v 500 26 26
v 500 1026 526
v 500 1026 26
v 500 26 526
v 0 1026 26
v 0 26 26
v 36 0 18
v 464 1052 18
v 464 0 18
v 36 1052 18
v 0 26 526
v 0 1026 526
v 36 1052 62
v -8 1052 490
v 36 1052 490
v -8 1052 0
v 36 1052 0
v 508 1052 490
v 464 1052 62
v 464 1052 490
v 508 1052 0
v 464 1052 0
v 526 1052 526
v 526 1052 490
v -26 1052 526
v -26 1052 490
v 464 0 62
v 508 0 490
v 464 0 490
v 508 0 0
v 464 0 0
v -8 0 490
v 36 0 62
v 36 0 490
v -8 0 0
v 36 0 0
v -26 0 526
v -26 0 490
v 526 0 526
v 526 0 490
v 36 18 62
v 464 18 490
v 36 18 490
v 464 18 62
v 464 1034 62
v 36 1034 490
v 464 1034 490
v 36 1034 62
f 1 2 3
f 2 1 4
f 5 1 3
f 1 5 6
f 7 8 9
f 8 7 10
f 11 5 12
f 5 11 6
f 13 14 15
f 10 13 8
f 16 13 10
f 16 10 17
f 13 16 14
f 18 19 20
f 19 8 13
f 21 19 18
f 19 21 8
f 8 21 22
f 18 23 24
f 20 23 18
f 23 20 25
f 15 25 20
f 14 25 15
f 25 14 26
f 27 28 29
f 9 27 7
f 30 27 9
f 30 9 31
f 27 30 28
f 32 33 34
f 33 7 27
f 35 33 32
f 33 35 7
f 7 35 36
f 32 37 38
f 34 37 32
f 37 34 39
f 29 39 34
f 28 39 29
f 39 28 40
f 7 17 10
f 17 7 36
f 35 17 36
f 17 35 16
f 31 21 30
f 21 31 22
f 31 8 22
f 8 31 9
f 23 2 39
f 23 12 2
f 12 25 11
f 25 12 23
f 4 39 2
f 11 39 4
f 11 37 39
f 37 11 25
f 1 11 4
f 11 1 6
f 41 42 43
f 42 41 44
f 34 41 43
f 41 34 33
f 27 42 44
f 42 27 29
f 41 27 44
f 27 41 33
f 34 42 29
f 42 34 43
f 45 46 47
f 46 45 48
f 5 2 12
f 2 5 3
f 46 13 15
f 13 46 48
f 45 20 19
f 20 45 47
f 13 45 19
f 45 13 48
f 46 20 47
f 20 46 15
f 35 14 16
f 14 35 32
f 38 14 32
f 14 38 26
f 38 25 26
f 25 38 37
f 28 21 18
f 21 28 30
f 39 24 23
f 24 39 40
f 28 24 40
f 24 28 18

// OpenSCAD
// Archiyou -> OpenSCAD  |  script: artcrate  |  units: mm
// OpenSCAD has no units: coordinates are in mm.
// Parts: 17 CSG, 0 baked, 0 2D
// Skipped: Curve:Line (open curve)
// Parameters at export, for reference only (nothing in this file is linked to them):
//   WIDTH = 50
//   DEPTH = 100
//   HEIGHT = 50
//   BOARD_THICKNESS = 8
//   LAT_WIDTH = 36
//   LAT_HEIGHT = 18

$fn = 32;
PART = "";

// bottomPlate  (layer bottom)
module bottomPlate() {
    color([0, 0, 1]) translate([250, 526, 22]) cube([500, 1052, 8], center = true);
}

// bottomLatLeft  (layer bottom)
module bottomLatLeft() {
    color([0, 0, 1]) translate([18, 526, 9]) cube([36, 1052, 18], center = true);
}

// bottomLatRight  (layer bottom)
module bottomLatRight() {
    color([0, 0, 1]) translate([482, 526, 9]) cube([36, 1052, 18], center = true);
}

// sideFrontPlate  (layer sidefront)
module sideFrontPlate() {
    color([0.502, 0, 0.502]) translate([250, 22, 276]) cube([500, 8, 500], center = true);
}

// sideFrontLatLeft  (layer sidefront)
module sideFrontLatLeft() {
    color([0.502, 0, 0.502]) translate([18, 9, 276]) cube([36, 18, 500], center = true);
}

// sideFrontLatRight  (layer sidefront)
module sideFrontLatRight() {
    color([0.502, 0, 0.502]) multmatrix([[-1, 0, 0, 482], [0, 1, 0, 9], [0, 0, 1, 276], [0, 0, 0, 1]]) cube([36, 18, 500], center = true);
}

// sideFrontLatBottom  (layer sidefront)
module sideFrontLatBottom() {
    color([0.502, 0, 0.502]) translate([250, 9, 44]) cube([428, 18, 36], center = true);
}

// sideFrontLatTop  (layer sidefront)
module sideFrontLatTop() {
    color([0.502, 0, 0.502]) multmatrix([[1, 0, 0, 250], [0, 1, 0, 9], [0, 0, -1, 508], [0, 0, 0, 1]]) cube([428, 18, 36], center = true);
}

// sideFrontPlate  (layer sideback)
module sideFrontPlate_2() {
    multmatrix([[1, 0, 0, 250], [0, -1, 0, 1030], [0, 0, 1, 276], [0, 0, 0, 1]]) cube([500, 8, 500], center = true);
}

// sideFrontLatLeft  (layer sideback)
module sideFrontLatLeft_2() {
    multmatrix([[1, 0, 0, 18], [0, -1, 0, 1043], [0, 0, 1, 276], [0, 0, 0, 1]]) cube([36, 18, 500], center = true);
}

// sideFrontLatRight  (layer sideback)
module sideFrontLatRight_2() {
    multmatrix([[-1, 0, 0, 482], [0, -1, 0, 1043], [0, 0, 1, 276], [0, 0, 0, 1]]) cube([36, 18, 500], center = true);
}

// sideFrontLatBottom  (layer sideback)
module sideFrontLatBottom_2() {
    multmatrix([[1, 0, 0, 250], [0, -1, 0, 1043], [0, 0, 1, 44], [0, 0, 0, 1]]) cube([428, 18, 36], center = true);
}

// sideFrontLatTop  (layer sideback)
module sideFrontLatTop_2() {
    multmatrix([[1, 0, 0, 250], [0, -1, 0, 1043], [0, 0, -1, 508], [0, 0, 0, 1]]) cube([428, 18, 36], center = true);
}

// sideLeftPlate  (layer sideleft)
module sideLeftPlate() {
    color([0, 0.502, 0]) translate([-4, 526, 263]) cube([8, 1052, 526], center = true);
}

// sideLeftLat  (layer sideleft)
module sideLeftLat() {
    color([0, 0.502, 0]) translate([-17, 526, 508]) cube([18, 1052, 36], center = true);
}

// sideLeftPlate  (layer sideright)
module sideLeftPlate_2() {
    color([1, 0.647, 0]) multmatrix([[-1, 0, 0, 504], [0, 1, 0, 526], [0, 0, 1, 263], [0, 0, 0, 1]]) cube([8, 1052, 526], center = true);
}

// sideLeftLat  (layer sideright)
module sideLeftLat_2() {
    color([1, 0.647, 0]) multmatrix([[-1, 0, 0, 517], [0, 1, 0, 526], [0, 0, 1, 508], [0, 0, 0, 1]]) cube([18, 1052, 36], center = true);
}

// 3D parts
if (PART == "" || PART == "bottomPlate") bottomPlate();
if (PART == "" || PART == "bottomLatLeft") bottomLatLeft();
if (PART == "" || PART == "bottomLatRight") bottomLatRight();
if (PART == "" || PART == "sideFrontPlate") sideFrontPlate();
if (PART == "" || PART == "sideFrontLatLeft") sideFrontLatLeft();
if (PART == "" || PART == "sideFrontLatRight") sideFrontLatRight();
if (PART == "" || PART == "sideFrontLatBottom") sideFrontLatBottom();
if (PART == "" || PART == "sideFrontLatTop") sideFrontLatTop();
if (PART == "" || PART == "sideFrontPlate_2") sideFrontPlate_2();
if (PART == "" || PART == "sideFrontLatLeft_2") sideFrontLatLeft_2();
if (PART == "" || PART == "sideFrontLatRight_2") sideFrontLatRight_2();
if (PART == "" || PART == "sideFrontLatBottom_2") sideFrontLatBottom_2();
if (PART == "" || PART == "sideFrontLatTop_2") sideFrontLatTop_2();
if (PART == "" || PART == "sideLeftPlate") sideLeftPlate();
if (PART == "" || PART == "sideLeftLat") sideLeftLat();
if (PART == "" || PART == "sideLeftPlate_2") sideLeftPlate_2();
if (PART == "" || PART == "sideLeftLat_2") sideLeftLat_2();
